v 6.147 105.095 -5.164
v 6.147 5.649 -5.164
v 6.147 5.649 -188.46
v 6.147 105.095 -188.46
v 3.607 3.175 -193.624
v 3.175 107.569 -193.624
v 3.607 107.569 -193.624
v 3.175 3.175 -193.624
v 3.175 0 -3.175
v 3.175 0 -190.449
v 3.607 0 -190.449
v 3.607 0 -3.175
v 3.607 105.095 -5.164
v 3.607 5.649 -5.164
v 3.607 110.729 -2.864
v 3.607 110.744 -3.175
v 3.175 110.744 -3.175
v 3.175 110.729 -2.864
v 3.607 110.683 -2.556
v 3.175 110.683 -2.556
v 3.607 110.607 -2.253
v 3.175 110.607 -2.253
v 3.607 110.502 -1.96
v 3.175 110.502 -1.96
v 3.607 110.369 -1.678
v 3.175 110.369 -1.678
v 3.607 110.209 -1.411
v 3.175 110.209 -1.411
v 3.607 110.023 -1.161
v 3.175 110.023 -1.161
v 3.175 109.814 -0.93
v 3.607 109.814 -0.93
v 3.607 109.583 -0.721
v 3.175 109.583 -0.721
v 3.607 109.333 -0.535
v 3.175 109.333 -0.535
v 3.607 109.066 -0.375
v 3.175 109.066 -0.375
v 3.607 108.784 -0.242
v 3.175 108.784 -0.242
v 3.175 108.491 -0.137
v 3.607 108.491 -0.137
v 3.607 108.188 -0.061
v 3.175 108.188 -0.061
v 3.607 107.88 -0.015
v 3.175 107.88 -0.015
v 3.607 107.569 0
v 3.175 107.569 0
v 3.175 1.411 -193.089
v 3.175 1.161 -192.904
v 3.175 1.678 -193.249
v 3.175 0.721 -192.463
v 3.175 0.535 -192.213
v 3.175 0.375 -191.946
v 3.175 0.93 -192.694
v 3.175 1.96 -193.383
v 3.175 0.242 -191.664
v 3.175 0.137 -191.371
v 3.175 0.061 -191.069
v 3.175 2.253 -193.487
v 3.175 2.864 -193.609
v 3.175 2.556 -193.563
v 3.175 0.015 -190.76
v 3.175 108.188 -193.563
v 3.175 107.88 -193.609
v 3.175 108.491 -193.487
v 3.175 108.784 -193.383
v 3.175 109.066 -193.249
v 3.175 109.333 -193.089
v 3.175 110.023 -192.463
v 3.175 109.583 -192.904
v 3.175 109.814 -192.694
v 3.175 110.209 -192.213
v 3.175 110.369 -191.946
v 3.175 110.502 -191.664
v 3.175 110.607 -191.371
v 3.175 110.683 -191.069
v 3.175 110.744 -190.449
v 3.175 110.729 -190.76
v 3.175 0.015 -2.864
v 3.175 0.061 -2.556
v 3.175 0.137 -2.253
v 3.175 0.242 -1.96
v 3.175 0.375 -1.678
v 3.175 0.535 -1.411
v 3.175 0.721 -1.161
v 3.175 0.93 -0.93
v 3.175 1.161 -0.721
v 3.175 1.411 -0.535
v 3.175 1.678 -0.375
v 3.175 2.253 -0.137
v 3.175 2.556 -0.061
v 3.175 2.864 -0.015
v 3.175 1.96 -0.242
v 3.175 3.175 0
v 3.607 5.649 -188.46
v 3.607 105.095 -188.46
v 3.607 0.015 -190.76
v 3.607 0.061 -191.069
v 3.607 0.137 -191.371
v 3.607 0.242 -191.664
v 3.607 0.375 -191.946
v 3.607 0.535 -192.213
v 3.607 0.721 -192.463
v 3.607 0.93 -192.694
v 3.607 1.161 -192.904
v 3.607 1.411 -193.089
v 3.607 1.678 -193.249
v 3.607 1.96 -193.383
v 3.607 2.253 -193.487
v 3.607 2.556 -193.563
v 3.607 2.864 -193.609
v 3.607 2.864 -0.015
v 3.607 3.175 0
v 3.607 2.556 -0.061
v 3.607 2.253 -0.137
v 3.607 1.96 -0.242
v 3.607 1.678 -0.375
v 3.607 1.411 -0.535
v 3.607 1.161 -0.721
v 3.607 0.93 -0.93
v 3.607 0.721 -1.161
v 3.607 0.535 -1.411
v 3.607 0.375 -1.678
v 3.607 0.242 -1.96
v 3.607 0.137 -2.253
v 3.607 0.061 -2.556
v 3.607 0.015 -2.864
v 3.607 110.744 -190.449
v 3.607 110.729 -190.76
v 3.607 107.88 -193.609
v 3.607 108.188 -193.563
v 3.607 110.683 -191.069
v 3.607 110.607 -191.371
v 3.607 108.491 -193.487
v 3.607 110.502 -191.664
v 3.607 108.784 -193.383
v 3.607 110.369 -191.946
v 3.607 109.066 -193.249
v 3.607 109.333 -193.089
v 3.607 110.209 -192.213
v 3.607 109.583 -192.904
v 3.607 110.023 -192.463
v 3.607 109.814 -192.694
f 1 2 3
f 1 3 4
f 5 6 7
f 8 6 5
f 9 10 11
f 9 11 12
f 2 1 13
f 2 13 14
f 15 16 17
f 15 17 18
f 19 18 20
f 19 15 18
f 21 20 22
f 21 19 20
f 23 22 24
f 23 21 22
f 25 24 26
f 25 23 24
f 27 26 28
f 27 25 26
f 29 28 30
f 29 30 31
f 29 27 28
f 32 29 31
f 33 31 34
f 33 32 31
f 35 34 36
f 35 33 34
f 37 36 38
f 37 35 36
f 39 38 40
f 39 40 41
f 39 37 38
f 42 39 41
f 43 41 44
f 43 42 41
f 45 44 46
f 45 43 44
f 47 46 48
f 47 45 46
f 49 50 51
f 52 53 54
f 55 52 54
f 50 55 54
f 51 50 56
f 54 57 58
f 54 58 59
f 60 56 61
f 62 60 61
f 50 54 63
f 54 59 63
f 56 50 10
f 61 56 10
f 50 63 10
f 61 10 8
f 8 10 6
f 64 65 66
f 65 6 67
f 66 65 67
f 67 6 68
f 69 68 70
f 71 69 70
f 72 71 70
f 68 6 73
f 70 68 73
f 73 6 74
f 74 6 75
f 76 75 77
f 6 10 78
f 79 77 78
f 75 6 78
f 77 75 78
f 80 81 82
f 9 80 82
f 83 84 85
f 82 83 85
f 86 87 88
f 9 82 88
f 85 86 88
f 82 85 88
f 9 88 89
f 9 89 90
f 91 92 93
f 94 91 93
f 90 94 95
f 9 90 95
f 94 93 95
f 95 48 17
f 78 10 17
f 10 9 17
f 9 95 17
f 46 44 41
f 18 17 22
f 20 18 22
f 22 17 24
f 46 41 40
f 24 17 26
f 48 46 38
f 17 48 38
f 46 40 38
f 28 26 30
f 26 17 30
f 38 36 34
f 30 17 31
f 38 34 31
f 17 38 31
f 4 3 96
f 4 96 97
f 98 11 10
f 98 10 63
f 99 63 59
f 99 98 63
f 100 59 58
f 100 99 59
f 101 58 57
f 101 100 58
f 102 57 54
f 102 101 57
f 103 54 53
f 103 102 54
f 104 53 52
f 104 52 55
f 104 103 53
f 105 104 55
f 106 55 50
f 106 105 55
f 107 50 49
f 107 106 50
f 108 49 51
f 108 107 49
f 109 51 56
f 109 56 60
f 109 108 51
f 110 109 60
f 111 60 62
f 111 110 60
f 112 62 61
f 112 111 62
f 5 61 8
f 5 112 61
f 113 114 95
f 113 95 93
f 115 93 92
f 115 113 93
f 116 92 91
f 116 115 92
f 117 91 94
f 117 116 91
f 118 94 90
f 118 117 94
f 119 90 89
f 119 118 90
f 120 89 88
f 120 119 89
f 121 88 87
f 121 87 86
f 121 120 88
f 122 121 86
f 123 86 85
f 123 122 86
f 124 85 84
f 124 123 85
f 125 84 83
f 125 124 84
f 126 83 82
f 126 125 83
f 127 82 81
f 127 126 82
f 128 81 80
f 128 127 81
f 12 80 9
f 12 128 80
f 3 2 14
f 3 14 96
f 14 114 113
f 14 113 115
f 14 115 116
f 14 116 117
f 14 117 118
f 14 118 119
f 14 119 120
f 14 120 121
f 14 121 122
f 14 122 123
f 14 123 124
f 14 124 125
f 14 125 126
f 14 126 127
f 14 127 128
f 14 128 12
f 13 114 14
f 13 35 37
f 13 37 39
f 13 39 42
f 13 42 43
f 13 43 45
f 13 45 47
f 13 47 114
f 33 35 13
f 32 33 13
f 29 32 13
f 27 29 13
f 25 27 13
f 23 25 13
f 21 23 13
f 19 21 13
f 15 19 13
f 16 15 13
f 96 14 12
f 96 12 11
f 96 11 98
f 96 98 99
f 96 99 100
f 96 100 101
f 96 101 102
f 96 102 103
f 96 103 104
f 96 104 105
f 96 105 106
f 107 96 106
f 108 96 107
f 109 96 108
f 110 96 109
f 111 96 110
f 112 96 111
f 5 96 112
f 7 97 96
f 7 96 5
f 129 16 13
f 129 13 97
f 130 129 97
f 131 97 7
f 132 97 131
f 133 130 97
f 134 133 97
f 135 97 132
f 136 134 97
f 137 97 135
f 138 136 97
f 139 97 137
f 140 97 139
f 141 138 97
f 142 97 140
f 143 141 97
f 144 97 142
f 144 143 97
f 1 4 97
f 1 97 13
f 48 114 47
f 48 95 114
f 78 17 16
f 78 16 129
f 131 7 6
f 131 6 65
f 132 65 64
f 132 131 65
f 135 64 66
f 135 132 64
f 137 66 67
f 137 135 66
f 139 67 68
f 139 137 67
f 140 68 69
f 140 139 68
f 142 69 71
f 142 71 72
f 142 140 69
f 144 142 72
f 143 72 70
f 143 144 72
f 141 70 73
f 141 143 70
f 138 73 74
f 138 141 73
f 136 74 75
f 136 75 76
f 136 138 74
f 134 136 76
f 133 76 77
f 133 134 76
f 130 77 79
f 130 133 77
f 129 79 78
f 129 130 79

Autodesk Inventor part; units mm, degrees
ref_plane "YZ Plane" through (0, 0, 0) normal (1, 0, 0) x (0, 1, 0)
ref_plane "XZ Plane" through (0, 0, 0) normal (0, 1, 0) x (-1, 0, 0)
ref_plane "XY Plane" through (0, 0, 0) normal (0, 0, 1) x (1, 0, 0)
sketch "Sketch1" plane through (0, 0, 0) normal (1, 0, 0) x (0, 1, 0)
  line L0 (0, 0) -> (110.744, 0)
  line L1 (110.744, 0) -> (110.744, -193.6242)
  line L2 (110.744, -193.6242) -> (0, -193.6242)
  line L3 (0, -193.6242) -> (0, 0)
  dimension "d0" = 193.6242
  dimension "d1" = 110.744
extrude "Extrusion1" add sketch "Sketch1" along normal blind 6.1468
fillet "Fillet1" radius 3.175 4 edges at (3.0734, 110.744, 0) (3.0734, 0, 0) (3.0734, 110.744, -193.6242) (3.0734, 0, -193.6242)
sketch "Sketch3" plane through (6.1468, 0, 0) normal (1, 0, 0) x (0, 0, -1)
  arc A0 (3.175, 110.744) -> (0, 107.569) centre (3.175, 107.569) ccw construction
  arc A1 (190.4492, 0) -> (193.6242, 3.175) centre (190.4492, 3.175) ccw construction
  line L0 (3.175, 107.569) -> (190.4492, 3.175) construction
  arc A2 (193.6242, 107.569) -> (190.4492, 110.744) centre (190.4492, 107.569) ccw construction
  arc A3 (0, 3.175) -> (3.175, 0) centre (3.175, 3.175) ccw construction
  line L1 (190.4492, 107.569) -> (3.175, 3.175) construction
  line L2 (5.1644, 5.6494) -> (188.4598, 5.6494)
  line L3 (188.4598, 5.6494) -> (188.4598, 105.0946)
  line L4 (188.4598, 105.0946) -> (5.1644, 105.0946)
  line L5 (5.1644, 105.0946) -> (5.1644, 5.6494)
  line L6 (5.1644, 5.6494) -> (188.4598, 105.0946) construction
  line L7 (188.4598, 5.6494) -> (5.1644, 105.0946) construction
  arc A4 (190.4492, 0) -> (193.6242, 3.175) centre (190.4492, 3.175) ccw projected
  line L8 (193.6242, 3.175) -> (193.6242, 107.569) projected
  arc A5 (193.6242, 107.569) -> (190.4492, 110.744) centre (190.4492, 107.569) ccw projected
  line L9 (190.4492, 110.744) -> (3.175, 110.744) projected
  arc A6 (3.175, 110.744) -> (0, 107.569) centre (3.175, 107.569) ccw projected
  line L10 (0, 107.569) -> (0, 3.175) projected
  arc A7 (0, 3.175) -> (3.175, 0) centre (3.175, 3.175) ccw projected
  line L11 (3.175, 0) -> (190.4492, 0) projected
  point P0 (0, 0)
  point P1 (96.8121, 55.372)
extrude "Extrusion3" cut sketch "Sketch3" against normal blind 2.54
move faces "Move1" translate (3.175, 0, 0) faces at (0, 36.9147, -65.5997)
properties part number "screen"
